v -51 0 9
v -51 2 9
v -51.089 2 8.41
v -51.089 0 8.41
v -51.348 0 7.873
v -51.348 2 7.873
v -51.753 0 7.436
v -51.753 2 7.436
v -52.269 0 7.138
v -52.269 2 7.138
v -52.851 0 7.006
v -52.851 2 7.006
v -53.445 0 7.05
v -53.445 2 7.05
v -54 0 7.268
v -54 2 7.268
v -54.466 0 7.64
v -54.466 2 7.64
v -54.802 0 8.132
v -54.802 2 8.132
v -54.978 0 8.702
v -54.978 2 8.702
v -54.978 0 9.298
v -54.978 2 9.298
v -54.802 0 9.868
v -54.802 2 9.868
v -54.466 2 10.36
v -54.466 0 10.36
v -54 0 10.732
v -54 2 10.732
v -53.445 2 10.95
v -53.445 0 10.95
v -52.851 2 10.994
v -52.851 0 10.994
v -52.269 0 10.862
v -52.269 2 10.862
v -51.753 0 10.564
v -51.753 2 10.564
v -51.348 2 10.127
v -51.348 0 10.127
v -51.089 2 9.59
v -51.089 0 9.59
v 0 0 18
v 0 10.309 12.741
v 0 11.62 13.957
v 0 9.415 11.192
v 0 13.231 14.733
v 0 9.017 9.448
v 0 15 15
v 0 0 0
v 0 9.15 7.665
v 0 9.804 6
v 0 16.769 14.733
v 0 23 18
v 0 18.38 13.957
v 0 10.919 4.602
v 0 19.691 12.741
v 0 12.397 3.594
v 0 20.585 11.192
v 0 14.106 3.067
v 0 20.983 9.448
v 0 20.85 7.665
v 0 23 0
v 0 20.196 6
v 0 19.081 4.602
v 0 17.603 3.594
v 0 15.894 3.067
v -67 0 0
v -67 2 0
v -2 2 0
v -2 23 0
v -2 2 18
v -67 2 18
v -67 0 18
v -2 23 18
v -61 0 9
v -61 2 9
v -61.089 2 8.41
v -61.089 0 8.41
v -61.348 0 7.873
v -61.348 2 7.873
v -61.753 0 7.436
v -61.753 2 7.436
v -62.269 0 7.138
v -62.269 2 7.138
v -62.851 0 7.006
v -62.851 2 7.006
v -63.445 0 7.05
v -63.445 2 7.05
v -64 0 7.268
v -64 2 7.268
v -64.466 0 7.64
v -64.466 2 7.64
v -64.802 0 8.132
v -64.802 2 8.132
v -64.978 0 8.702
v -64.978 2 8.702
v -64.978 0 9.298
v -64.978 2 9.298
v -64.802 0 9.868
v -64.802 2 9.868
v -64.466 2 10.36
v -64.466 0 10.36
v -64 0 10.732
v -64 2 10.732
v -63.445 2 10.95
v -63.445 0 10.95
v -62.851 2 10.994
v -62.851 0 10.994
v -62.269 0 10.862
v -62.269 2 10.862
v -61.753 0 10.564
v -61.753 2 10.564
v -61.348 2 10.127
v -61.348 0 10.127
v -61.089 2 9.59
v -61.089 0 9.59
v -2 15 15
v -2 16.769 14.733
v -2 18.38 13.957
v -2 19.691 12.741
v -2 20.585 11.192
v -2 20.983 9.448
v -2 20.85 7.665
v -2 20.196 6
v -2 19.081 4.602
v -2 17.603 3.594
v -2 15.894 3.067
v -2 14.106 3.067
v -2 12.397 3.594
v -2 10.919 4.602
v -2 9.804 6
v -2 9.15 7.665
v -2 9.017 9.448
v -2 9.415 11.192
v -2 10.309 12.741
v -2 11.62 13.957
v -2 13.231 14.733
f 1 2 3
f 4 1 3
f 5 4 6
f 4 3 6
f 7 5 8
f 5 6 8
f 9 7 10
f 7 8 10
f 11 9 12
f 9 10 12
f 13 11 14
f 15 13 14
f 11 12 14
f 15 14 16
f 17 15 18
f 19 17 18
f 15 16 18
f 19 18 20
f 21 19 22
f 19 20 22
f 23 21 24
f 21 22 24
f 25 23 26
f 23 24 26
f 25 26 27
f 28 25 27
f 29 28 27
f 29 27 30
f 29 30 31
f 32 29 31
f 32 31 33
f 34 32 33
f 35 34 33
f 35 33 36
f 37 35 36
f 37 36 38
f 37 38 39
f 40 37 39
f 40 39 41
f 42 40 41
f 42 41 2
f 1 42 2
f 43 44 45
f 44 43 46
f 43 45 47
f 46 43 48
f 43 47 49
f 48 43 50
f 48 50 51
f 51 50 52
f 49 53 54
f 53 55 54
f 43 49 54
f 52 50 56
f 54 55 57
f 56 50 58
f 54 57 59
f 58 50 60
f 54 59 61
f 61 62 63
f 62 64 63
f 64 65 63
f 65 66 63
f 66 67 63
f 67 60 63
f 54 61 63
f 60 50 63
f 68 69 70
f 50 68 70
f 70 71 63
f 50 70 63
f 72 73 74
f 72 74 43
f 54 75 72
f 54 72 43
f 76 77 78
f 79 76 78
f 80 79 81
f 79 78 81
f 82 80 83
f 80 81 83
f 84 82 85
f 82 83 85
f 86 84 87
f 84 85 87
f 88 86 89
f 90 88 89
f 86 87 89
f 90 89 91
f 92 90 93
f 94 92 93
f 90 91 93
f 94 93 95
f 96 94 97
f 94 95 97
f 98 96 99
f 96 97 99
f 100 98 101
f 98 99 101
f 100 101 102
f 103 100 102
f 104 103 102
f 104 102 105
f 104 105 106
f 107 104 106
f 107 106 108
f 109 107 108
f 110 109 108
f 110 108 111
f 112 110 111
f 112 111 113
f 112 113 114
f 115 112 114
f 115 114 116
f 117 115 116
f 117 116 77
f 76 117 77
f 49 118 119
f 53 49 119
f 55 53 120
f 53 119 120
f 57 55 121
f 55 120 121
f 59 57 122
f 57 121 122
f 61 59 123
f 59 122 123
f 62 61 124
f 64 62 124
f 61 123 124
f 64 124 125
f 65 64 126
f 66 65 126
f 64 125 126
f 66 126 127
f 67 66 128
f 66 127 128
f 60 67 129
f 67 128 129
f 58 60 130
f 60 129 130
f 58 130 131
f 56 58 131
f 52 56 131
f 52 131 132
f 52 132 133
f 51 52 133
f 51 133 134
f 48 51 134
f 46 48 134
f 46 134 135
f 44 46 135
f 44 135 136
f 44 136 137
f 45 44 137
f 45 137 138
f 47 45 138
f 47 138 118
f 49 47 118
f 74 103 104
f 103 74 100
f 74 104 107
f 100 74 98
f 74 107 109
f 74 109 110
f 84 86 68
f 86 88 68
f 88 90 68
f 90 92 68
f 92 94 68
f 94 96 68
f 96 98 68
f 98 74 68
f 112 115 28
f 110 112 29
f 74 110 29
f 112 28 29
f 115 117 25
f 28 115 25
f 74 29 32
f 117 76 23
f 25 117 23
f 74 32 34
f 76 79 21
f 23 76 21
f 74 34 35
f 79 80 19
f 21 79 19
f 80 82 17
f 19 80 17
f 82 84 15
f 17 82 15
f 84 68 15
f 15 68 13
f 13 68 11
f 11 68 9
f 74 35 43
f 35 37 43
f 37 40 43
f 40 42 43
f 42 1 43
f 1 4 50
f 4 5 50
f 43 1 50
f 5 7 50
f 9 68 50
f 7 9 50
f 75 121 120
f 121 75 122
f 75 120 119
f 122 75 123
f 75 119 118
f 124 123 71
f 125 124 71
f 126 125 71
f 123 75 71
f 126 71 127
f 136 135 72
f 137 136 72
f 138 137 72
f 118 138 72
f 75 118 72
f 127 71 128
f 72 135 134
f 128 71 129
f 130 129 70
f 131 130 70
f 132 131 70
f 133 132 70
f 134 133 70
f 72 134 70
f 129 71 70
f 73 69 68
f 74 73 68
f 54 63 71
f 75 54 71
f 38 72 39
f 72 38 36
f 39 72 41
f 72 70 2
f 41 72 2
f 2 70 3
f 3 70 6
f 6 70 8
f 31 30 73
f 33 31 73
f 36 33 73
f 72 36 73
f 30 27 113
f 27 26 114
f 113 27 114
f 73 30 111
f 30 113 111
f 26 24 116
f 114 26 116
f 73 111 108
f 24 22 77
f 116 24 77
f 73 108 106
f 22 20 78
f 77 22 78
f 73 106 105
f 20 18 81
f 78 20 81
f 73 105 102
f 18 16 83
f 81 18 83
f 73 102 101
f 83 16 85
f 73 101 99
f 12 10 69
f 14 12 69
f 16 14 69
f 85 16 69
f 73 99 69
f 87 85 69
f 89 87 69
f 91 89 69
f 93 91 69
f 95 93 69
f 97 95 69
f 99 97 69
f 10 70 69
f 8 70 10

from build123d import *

# Parameters (mm, degrees)
BOSS_EXTRUDE1_DEPTH = 18
CUT_EXTRUDE1_REACH  = 4
SKETCH2_R           = 6
CUT_EXTRUDE2_REACH  = 4
SKETCH3_R           = 2


with BuildPart() as part:
    # Sketch1 → Boss-Extrude1 (new body)
    with BuildSketch(Plane.XY):
        Polygon((0, 0), (0, 23), (-2, 23), (-2, 2), (-67, 2), (-67, 0), align=None)
    extrude(amount=BOSS_EXTRUDE1_DEPTH)

    # Sketch2 → Cut-Extrude1 (cut, up to next)
    with BuildSketch(Plane.ZY.offset(2), mode=Mode.PRIVATE) as cut_extrude1_sk1:
        with Locations((9, 15)):
            Circle(SKETCH2_R)
    cut_extrude1_tool1 = extrude(cut_extrude1_sk1.sketch, amount=-CUT_EXTRUDE1_REACH, mode=Mode.PRIVATE) & part.part
    add(cut_extrude1_tool1.solids().sort_by_distance((-2, 15, 9))[0], mode=Mode.SUBTRACT)

    # Sketch3 → Cut-Extrude2 (cut, up to next)
    with BuildSketch(Plane(origin=(0, 2, 0), x_dir=(1, 0, 0), z_dir=(0, 1, 0)), mode=Mode.PRIVATE) as cut_extrude2_sk1:
        with Locations((-63, -9)):
            Circle(SKETCH3_R)
    cut_extrude2_tool1 = extrude(cut_extrude2_sk1.sketch, amount=-CUT_EXTRUDE2_REACH, mode=Mode.PRIVATE) & part.part
    add(cut_extrude2_tool1.solids().sort_by_distance((-63, 2, 9))[0], mode=Mode.SUBTRACT)
    # Sketch3 → Cut-Extrude2 (cut, up to next)
    with BuildSketch(Plane(origin=(0, 2, 0), x_dir=(1, 0, 0), z_dir=(0, 1, 0)), mode=Mode.PRIVATE) as cut_extrude2_sk2:
        with Locations((-53, -9)):
            Circle(SKETCH3_R)
    cut_extrude2_tool2 = extrude(cut_extrude2_sk2.sketch, amount=-CUT_EXTRUDE2_REACH, mode=Mode.PRIVATE) & part.part
    add(cut_extrude2_tool2.solids().sort_by_distance((-53, 2, 9))[0], mode=Mode.SUBTRACT)


solid = part.part
